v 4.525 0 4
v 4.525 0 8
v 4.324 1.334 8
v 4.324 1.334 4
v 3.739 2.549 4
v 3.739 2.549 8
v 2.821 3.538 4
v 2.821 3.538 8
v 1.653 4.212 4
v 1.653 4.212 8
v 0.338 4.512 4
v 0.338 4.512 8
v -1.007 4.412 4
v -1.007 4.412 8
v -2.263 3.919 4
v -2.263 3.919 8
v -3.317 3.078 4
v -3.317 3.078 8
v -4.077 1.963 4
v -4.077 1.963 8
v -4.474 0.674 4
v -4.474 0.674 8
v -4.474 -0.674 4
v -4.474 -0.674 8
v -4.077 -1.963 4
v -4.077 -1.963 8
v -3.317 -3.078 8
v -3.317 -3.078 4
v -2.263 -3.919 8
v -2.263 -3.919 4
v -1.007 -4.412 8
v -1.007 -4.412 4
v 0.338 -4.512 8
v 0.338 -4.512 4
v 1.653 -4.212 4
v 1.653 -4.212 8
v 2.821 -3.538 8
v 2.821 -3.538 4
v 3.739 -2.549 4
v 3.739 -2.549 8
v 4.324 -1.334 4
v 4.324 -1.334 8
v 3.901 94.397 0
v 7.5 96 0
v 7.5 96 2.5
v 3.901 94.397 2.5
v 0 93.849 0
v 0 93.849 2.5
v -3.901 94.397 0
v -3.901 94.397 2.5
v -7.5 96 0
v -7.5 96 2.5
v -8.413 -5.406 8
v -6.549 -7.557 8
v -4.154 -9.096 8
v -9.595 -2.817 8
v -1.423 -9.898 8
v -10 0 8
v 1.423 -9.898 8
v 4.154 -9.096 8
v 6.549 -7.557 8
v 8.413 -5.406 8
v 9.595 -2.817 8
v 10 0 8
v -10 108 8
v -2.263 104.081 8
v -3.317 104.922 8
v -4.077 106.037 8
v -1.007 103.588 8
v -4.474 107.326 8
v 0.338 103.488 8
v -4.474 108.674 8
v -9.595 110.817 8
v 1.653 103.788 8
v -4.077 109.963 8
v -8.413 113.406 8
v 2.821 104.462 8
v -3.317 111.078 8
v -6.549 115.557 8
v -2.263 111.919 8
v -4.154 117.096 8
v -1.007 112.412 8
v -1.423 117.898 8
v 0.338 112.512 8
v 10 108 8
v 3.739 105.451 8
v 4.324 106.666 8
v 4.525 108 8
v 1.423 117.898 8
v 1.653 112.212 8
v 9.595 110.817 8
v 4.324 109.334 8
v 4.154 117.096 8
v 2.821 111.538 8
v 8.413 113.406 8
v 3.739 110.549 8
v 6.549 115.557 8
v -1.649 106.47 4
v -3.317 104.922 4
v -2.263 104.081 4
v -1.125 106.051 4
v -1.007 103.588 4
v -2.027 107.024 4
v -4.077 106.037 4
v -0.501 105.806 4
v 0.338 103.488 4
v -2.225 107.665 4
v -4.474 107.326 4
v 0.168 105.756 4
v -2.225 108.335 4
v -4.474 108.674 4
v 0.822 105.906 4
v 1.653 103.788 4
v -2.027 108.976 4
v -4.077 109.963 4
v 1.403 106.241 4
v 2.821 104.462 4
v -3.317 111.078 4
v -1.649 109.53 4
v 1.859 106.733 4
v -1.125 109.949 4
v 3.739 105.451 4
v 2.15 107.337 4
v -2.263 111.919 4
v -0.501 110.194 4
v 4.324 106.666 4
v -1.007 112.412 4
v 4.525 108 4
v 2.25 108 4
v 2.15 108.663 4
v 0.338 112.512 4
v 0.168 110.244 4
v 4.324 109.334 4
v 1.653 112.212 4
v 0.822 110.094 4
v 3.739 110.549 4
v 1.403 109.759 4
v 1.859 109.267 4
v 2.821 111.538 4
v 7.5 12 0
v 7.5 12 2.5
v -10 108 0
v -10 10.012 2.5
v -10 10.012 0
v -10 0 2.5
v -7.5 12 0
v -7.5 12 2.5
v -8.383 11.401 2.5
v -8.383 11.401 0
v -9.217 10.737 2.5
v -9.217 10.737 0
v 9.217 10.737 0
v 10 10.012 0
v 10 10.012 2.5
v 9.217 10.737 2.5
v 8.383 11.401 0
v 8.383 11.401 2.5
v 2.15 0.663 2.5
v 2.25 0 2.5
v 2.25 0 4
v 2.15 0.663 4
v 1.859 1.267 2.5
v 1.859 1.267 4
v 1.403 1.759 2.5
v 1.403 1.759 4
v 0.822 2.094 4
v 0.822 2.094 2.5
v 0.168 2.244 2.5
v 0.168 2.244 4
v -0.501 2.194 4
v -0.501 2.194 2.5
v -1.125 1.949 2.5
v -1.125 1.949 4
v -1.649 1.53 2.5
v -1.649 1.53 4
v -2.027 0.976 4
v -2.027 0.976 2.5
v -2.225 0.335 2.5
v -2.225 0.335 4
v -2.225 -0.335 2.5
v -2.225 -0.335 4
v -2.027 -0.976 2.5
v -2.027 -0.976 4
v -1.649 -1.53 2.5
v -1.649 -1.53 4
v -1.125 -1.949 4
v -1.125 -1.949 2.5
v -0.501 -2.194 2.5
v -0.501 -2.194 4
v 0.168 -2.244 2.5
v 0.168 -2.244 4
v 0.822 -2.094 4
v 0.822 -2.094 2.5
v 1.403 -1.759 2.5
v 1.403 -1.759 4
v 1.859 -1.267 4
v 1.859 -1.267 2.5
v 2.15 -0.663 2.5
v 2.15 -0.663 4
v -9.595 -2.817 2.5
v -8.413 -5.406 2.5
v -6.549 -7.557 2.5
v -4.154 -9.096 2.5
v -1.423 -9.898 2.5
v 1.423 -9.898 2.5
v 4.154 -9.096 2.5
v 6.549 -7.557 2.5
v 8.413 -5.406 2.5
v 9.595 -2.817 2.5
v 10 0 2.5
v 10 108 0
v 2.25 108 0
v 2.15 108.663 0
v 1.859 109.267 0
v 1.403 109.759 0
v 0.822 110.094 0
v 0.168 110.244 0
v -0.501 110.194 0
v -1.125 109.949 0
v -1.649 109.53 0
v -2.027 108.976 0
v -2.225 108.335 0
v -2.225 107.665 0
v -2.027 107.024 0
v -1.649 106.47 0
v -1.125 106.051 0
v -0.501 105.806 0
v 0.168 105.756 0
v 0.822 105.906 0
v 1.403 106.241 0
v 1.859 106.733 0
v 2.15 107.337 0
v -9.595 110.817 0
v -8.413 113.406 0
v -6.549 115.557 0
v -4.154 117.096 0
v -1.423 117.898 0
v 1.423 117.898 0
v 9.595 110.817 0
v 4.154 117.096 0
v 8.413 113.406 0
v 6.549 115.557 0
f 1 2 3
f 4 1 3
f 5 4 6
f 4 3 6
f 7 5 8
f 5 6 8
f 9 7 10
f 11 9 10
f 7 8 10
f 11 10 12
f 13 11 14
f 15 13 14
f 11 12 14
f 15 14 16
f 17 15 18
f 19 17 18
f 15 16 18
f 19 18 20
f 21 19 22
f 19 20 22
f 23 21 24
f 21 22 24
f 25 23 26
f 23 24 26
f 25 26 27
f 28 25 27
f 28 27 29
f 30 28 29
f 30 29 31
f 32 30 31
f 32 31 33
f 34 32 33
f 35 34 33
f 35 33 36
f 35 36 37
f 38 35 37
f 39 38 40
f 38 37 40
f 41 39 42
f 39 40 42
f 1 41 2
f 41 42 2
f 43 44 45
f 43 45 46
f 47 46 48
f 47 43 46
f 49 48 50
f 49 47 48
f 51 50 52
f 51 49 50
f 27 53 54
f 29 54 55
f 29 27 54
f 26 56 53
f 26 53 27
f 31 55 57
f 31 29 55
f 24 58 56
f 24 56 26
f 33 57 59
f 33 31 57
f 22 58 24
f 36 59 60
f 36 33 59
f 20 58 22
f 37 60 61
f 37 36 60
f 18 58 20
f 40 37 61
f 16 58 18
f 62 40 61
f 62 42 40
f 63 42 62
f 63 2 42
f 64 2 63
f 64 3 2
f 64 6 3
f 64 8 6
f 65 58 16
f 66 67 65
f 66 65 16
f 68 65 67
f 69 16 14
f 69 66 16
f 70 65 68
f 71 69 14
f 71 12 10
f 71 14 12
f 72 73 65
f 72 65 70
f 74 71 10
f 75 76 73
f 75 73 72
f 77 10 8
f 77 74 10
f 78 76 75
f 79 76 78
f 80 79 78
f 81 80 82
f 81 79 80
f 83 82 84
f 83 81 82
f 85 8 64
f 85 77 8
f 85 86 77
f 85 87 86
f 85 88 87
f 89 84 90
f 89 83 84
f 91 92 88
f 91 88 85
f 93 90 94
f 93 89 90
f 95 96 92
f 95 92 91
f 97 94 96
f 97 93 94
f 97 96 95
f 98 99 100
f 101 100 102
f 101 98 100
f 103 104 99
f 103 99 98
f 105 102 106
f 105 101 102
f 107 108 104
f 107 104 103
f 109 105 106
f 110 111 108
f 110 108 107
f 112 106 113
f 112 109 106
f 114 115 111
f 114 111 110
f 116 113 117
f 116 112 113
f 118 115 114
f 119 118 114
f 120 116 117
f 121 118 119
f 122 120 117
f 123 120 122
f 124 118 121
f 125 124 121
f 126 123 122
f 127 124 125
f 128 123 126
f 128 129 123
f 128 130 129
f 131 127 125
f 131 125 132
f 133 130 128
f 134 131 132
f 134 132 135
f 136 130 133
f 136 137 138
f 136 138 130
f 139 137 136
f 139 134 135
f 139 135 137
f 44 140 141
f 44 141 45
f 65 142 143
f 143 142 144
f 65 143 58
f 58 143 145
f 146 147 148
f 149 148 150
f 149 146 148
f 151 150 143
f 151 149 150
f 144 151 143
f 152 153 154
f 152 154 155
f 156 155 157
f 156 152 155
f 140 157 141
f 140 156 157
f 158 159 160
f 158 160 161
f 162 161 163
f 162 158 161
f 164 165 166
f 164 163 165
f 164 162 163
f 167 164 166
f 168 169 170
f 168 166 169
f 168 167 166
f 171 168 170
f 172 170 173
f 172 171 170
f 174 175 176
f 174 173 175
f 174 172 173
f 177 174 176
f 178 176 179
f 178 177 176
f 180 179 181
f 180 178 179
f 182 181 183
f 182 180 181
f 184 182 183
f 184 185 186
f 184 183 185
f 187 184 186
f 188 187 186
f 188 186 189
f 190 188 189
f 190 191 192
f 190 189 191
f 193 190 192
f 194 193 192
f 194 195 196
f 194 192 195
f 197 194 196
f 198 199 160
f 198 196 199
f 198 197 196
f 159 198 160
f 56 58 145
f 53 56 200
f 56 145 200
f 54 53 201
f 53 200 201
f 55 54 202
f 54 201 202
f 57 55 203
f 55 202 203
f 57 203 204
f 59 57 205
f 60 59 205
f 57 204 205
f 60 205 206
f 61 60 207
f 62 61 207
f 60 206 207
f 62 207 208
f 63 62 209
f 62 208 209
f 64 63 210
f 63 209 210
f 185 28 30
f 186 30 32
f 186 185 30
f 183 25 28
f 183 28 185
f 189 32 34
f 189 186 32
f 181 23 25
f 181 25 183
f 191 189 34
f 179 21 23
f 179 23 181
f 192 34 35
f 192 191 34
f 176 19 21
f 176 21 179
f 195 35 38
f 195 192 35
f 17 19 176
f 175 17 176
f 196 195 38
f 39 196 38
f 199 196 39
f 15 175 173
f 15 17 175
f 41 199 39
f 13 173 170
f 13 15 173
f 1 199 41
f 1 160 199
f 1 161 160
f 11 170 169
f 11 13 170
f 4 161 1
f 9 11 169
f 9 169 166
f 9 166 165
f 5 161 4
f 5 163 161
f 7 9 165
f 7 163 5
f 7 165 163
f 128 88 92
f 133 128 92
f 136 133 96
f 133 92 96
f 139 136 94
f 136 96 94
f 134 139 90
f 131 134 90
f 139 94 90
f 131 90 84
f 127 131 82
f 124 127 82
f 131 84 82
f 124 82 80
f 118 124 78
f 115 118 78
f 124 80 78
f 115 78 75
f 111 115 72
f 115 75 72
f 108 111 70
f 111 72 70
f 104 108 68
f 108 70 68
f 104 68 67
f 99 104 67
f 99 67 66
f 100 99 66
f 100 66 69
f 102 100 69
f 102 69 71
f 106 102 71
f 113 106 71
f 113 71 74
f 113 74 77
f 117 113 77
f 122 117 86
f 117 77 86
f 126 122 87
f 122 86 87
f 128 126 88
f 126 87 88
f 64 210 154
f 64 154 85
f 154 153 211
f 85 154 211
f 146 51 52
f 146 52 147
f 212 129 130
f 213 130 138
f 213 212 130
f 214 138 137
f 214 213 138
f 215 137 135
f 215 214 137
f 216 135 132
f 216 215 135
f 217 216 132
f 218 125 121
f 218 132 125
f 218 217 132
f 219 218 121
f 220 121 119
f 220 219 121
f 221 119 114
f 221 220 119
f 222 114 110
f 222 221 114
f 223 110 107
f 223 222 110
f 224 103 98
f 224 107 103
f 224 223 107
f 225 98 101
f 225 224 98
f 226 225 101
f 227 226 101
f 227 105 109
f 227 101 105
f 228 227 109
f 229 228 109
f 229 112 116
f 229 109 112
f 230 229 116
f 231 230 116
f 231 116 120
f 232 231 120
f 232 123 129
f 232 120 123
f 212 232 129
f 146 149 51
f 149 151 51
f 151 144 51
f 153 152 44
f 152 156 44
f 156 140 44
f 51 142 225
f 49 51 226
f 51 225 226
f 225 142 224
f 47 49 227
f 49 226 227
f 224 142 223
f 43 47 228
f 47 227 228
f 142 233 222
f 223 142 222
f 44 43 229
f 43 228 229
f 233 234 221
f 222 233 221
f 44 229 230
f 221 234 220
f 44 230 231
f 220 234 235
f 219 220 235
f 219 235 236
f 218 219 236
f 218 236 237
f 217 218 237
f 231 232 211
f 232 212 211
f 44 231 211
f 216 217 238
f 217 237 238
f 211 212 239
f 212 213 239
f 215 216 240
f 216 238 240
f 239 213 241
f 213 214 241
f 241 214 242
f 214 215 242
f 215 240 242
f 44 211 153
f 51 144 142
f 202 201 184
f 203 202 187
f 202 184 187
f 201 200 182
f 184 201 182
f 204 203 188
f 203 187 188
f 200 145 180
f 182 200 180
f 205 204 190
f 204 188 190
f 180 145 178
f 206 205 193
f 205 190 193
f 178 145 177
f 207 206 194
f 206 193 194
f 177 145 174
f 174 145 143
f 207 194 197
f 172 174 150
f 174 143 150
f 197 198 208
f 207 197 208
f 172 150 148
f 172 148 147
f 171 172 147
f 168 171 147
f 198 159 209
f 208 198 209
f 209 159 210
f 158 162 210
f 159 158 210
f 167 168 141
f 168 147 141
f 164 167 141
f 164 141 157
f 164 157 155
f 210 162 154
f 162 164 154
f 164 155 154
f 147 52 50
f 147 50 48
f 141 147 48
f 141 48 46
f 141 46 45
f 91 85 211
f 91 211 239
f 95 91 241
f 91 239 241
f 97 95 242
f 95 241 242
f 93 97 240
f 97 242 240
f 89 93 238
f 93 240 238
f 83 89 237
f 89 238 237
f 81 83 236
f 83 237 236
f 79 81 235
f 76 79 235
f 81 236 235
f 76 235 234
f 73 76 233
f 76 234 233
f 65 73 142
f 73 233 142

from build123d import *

# Parameters (mm, degrees)
SKETCH1_R           = 2.25
BOSS_EXTRUDE1_DEPTH = 8
SKETCH2_R           = 4.525
CUT_EXTRUDE1_DEPTH  = 4
CUT_EXTRUDE2_DEPTH  = 2.5


with BuildPart() as part:
    # Sketch1 → Boss-Extrude1 (new body)
    with BuildSketch(Plane.XY):
        with BuildLine():
            Line((10, 0), (10, 108))
            ThreePointArc((10, 108), (0, 118), (-10, 108))
            Line((-10, 108), (-10, 0))
            ThreePointArc((-10, 0), (0, -10), (10, 0))
        make_face()
        Circle(SKETCH1_R, mode=Mode.SUBTRACT)
        with Locations((0, 108)):
            Circle(SKETCH1_R, mode=Mode.SUBTRACT)
    extrude(amount=BOSS_EXTRUDE1_DEPTH)

    # Sketch2 → Cut-Extrude1 (cut)
    with BuildSketch(Plane.XY.offset(8)):
        Circle(SKETCH2_R)
        with Locations((0, 108)):
            Circle(SKETCH2_R)
    extrude(amount=-CUT_EXTRUDE1_DEPTH, mode=Mode.SUBTRACT)

    # Sketch3 → Cut-Extrude2 (cut)
    with BuildSketch(Plane.XY):
        with BuildLine():
            Line((7.5, 12), (7.5, 96))
            ThreePointArc((7.5, 96), (0, 93.849028302), (-7.5, 96))
            Line((-7.5, 96), (-7.5, 12))
            ThreePointArc((-7.5, 12), (0, -14.150971698), (7.5, 12))
        make_face()
    extrude(amount=CUT_EXTRUDE2_DEPTH, mode=Mode.SUBTRACT)


solid = part.part
